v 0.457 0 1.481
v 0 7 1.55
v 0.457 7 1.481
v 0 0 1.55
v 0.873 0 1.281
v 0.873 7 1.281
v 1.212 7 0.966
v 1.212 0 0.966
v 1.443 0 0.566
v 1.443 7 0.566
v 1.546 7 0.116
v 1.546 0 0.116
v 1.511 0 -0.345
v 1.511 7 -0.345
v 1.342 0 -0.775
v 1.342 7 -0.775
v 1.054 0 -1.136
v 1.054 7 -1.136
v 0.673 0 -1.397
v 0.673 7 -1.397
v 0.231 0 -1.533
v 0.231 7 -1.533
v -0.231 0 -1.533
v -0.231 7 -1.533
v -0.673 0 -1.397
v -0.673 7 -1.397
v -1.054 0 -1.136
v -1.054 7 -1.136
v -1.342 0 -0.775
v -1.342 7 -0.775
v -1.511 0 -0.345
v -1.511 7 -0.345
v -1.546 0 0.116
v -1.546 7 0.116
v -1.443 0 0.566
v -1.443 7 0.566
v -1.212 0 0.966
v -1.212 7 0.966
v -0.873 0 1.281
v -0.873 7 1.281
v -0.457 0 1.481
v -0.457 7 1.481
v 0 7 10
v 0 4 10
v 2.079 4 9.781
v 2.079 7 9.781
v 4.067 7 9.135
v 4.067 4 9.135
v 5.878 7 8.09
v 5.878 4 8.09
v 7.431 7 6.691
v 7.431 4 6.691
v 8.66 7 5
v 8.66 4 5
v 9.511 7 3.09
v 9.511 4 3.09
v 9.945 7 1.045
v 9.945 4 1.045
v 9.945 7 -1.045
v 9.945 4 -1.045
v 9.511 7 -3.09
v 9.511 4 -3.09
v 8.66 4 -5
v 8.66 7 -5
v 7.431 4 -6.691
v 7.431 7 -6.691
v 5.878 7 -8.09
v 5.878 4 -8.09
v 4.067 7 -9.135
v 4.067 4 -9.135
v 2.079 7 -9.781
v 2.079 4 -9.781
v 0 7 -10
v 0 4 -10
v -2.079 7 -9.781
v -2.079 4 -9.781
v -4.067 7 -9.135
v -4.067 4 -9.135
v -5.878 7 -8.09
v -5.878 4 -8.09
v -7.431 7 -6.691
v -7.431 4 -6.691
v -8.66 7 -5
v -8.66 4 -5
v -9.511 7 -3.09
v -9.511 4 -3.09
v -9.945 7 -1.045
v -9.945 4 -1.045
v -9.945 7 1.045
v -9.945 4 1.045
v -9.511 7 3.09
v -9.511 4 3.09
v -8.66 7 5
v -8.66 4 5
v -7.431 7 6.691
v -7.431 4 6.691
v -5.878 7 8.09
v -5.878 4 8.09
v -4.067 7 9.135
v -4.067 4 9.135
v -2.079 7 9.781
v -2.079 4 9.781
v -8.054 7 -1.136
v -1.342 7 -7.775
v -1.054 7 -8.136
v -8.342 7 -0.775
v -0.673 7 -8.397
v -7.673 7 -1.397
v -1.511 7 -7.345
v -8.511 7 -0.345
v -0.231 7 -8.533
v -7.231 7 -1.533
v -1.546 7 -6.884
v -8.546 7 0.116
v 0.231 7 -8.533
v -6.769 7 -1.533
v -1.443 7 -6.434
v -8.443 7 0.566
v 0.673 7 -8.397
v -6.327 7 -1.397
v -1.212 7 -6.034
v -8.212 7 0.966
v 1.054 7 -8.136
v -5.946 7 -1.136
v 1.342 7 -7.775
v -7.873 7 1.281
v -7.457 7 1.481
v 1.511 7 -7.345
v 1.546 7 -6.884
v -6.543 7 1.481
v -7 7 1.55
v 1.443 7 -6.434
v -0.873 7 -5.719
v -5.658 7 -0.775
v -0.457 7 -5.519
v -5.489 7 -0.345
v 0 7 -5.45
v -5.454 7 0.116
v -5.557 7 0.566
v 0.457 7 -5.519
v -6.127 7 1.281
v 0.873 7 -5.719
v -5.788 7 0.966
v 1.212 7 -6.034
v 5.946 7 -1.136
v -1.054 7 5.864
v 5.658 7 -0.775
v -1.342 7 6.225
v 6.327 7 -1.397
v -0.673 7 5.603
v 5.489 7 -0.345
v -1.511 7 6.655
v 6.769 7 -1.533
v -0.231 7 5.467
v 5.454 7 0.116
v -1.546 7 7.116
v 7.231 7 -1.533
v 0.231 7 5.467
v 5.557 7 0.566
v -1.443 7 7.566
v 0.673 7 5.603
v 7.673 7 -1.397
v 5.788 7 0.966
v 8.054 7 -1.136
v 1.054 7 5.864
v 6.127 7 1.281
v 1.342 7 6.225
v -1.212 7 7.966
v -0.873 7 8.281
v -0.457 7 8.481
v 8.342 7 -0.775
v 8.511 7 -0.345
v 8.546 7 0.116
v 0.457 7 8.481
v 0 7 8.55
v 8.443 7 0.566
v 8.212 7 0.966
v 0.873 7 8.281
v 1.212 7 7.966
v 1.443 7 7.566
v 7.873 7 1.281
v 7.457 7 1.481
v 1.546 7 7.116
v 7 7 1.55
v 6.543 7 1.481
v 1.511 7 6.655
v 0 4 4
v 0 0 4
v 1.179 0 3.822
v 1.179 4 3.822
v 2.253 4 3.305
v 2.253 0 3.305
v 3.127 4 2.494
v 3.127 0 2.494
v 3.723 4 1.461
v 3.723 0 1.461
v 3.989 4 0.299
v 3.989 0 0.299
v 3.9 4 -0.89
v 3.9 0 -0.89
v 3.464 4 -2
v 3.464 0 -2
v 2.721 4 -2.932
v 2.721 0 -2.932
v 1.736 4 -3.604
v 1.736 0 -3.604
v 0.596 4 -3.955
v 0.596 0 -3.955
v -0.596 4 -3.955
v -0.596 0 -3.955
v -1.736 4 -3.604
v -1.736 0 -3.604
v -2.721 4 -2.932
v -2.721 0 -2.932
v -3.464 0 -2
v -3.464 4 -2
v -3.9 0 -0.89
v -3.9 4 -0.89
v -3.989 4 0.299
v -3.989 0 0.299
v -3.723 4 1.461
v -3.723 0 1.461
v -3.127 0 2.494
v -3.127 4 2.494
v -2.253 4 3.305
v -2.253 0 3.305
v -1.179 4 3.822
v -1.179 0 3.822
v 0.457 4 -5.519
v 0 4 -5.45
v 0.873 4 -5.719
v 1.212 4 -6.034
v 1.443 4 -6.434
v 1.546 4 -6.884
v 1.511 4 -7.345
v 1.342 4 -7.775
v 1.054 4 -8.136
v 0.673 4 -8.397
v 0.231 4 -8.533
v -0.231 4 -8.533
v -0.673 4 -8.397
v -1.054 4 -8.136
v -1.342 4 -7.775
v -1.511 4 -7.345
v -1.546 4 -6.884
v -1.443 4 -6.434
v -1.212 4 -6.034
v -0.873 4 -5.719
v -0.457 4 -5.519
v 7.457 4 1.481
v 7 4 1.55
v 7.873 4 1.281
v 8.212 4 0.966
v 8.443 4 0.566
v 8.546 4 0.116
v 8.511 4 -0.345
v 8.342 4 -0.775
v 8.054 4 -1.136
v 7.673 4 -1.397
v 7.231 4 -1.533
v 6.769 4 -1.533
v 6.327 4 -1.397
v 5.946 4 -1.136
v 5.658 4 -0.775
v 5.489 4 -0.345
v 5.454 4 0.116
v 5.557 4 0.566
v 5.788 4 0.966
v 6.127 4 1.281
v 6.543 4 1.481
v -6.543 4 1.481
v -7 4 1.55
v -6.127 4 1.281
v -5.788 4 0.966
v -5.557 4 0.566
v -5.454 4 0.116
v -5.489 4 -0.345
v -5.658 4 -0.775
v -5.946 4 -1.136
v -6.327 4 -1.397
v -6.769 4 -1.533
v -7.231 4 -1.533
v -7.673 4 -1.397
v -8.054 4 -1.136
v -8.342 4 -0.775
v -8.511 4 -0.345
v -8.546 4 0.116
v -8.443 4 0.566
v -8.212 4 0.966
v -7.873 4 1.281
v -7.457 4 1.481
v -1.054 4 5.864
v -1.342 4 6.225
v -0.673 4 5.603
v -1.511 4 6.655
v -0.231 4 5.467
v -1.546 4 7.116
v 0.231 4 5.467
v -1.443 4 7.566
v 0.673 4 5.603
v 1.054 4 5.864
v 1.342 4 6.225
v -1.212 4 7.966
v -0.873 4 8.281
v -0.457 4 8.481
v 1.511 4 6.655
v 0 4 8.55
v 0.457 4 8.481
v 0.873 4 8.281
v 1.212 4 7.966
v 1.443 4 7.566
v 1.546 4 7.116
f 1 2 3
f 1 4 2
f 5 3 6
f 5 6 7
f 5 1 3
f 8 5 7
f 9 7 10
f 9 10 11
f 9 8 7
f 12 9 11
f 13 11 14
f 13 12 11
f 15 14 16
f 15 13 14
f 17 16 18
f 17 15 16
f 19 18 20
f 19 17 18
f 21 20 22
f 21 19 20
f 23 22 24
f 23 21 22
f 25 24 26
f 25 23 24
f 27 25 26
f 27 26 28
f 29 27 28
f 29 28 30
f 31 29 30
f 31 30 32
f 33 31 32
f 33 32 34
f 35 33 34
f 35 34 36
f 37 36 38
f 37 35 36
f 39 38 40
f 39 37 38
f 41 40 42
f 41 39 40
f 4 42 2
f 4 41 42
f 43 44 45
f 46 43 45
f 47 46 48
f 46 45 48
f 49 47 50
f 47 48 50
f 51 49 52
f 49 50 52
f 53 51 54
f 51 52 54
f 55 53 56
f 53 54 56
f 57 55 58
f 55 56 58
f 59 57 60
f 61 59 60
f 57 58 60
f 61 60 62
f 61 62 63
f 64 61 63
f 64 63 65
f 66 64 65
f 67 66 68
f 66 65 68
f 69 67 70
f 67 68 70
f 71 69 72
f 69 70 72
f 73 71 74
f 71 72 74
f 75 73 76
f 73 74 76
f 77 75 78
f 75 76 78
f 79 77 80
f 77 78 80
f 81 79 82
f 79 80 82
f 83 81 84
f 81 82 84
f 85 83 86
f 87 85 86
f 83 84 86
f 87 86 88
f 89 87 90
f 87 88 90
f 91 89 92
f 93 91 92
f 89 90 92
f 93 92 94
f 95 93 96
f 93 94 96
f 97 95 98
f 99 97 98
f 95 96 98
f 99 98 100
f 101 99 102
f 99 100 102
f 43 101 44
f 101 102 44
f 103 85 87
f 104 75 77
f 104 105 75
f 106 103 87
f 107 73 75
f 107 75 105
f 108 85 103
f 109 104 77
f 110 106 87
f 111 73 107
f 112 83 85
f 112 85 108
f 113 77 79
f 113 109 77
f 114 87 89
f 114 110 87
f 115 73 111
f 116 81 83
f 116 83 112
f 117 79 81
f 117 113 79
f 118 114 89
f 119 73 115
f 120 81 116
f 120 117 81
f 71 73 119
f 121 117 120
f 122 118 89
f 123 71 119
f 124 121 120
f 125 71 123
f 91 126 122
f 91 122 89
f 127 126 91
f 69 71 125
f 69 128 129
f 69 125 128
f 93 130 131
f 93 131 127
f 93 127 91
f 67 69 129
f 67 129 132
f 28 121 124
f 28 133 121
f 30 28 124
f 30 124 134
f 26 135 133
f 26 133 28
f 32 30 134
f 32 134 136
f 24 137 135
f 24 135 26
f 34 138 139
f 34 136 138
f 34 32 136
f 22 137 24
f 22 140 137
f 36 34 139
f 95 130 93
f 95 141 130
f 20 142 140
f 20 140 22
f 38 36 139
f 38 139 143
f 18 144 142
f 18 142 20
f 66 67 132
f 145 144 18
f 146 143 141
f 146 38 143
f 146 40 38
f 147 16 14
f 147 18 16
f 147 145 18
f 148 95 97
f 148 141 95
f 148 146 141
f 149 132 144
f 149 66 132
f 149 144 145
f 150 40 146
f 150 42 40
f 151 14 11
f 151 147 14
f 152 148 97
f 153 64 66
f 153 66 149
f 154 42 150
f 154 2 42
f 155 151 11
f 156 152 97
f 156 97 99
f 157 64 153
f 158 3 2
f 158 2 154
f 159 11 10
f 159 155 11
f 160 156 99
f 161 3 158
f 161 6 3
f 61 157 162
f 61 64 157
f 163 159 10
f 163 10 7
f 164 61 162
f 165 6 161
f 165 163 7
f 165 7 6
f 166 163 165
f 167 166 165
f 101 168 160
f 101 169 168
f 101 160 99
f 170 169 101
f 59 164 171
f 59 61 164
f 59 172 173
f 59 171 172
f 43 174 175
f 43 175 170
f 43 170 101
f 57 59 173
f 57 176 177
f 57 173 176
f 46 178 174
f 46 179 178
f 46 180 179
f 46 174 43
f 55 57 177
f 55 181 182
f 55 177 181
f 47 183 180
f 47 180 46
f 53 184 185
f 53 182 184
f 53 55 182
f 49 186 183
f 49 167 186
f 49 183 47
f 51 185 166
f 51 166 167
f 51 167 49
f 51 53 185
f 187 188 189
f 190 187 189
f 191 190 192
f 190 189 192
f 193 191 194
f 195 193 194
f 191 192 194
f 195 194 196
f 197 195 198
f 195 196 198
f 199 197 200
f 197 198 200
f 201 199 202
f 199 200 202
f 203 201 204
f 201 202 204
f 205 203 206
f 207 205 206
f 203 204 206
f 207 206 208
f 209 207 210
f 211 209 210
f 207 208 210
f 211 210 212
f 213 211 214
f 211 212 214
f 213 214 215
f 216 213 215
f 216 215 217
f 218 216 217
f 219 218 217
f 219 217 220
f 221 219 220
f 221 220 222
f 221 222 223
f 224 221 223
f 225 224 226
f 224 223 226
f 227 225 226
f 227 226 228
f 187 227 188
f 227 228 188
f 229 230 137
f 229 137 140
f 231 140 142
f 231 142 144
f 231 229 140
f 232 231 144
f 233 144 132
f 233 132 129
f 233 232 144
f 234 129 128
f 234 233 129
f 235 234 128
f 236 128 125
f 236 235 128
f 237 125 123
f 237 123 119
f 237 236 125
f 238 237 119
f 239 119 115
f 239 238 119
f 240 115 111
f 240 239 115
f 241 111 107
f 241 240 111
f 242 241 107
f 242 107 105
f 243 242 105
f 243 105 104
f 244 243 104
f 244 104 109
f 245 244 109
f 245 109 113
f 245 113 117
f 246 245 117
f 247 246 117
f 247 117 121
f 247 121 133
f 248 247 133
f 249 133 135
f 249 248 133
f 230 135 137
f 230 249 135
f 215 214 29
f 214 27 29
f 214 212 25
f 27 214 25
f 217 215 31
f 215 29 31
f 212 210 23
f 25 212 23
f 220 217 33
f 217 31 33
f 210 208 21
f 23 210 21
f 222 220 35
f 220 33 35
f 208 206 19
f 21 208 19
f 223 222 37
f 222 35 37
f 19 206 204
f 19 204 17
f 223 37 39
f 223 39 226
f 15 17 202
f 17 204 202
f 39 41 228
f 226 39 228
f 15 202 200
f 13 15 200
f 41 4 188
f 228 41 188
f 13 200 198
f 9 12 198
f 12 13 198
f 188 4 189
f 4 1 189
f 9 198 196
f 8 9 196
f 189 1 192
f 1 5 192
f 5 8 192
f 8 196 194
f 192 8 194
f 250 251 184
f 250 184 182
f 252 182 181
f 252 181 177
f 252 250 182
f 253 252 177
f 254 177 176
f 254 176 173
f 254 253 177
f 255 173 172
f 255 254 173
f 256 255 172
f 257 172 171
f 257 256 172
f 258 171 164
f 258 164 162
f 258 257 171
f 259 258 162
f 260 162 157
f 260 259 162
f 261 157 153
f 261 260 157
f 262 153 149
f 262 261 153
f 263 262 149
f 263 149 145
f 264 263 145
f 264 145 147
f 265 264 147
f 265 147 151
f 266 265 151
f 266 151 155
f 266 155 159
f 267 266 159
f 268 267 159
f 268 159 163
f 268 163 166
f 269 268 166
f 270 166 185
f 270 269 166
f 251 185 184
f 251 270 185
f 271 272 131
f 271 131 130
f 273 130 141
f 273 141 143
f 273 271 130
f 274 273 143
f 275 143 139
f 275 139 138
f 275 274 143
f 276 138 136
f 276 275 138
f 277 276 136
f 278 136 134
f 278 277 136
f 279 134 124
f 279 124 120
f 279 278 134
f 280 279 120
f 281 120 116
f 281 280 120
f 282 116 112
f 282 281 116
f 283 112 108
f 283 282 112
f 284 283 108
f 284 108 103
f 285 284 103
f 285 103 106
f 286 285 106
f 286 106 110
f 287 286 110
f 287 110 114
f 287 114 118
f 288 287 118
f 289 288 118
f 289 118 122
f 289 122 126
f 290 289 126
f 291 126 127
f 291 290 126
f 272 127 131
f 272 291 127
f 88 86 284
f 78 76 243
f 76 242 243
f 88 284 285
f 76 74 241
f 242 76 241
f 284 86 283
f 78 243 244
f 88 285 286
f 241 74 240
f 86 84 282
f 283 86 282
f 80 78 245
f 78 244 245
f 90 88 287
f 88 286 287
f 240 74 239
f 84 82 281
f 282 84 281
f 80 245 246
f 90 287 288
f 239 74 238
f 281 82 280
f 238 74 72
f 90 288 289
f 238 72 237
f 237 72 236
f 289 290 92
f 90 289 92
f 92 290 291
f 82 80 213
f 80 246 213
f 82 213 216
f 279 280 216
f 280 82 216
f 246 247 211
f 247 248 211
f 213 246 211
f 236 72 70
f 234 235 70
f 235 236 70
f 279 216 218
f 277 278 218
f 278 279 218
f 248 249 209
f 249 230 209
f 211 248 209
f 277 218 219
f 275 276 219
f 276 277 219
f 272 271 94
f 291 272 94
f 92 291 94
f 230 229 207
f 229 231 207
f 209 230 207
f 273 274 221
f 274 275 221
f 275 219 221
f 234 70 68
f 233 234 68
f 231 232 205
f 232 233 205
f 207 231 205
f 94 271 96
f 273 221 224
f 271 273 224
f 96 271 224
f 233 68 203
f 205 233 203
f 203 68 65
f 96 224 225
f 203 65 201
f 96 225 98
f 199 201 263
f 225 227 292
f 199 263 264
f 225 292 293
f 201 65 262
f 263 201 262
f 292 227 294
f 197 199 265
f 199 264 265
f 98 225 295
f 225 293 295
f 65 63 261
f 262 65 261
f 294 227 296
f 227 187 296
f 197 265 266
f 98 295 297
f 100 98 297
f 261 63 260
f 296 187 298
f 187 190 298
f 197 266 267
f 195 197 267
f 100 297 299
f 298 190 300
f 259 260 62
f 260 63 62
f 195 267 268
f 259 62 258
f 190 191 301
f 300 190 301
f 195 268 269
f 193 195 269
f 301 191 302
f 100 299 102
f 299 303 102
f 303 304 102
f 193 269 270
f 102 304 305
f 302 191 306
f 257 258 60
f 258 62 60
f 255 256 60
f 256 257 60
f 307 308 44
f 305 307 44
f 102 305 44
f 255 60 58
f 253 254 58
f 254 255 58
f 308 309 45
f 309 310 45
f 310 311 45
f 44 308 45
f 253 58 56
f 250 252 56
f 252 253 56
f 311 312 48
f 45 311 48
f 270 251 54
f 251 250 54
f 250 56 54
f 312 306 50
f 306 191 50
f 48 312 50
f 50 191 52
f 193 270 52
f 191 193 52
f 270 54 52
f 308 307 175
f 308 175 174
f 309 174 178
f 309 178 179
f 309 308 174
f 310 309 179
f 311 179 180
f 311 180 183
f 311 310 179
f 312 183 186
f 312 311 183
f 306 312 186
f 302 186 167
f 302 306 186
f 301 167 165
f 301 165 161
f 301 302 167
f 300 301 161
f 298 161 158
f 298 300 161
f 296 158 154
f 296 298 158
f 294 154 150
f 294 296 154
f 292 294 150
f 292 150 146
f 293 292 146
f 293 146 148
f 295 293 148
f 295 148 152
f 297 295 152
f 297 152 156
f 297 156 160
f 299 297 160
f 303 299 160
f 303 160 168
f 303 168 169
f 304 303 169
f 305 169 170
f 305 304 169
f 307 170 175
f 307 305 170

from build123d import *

# Parameters (mm, degrees)
SKETCH_1_R      = 4
SKETCH_1_R_2    = 1.55
EXTRUDE_1_DEPTH = 4
SKETCH_2_R      = 10
SKETCH_2_R_2    = 1.55
EXTRUDE_2_DEPTH = 3


with BuildPart() as part:
    # 草图1 → 凸台-拉伸1 (new body)
    with BuildSketch(Plane(origin=(0, 0, 0), x_dir=(1, 0, 0), z_dir=(0, 1, 0))):
        with Locations(Location((0, 0, 0), (0, 0, 270))):
            Circle(SKETCH_1_R)
        with Locations(Location((0, 0, 0), (0, 0, 270))):
            Circle(SKETCH_1_R_2, mode=Mode.SUBTRACT)
    extrude(amount=EXTRUDE_1_DEPTH)

    # 草图2 → 凸台-拉伸2 (add)
    with BuildSketch(Plane(origin=(0, 4, 0), x_dir=(1, 0, 0), z_dir=(0, 1, 0))):
        with Locations(Location((0, 0, 0), (0, 0, 270))):
            Circle(SKETCH_2_R)
        with Locations(Location((0, 0, 0), (0, 0, 270))):
            Circle(SKETCH_2_R_2, mode=Mode.SUBTRACT)
        with Locations(Location((0, 7, 0), (0, 0, 270))):
            Circle(SKETCH_2_R_2, mode=Mode.SUBTRACT)
        with Locations(Location((7, 0, 0), (0, 0, 270))):
            Circle(SKETCH_2_R_2, mode=Mode.SUBTRACT)
        with Locations(Location((0, -7, 0), (0, 0, 270))):
            Circle(SKETCH_2_R_2, mode=Mode.SUBTRACT)
        with Locations(Location((-7, 0, 0), (0, 0, 270))):
            Circle(SKETCH_2_R_2, mode=Mode.SUBTRACT)
    extrude(amount=EXTRUDE_2_DEPTH)


solid = part.part
